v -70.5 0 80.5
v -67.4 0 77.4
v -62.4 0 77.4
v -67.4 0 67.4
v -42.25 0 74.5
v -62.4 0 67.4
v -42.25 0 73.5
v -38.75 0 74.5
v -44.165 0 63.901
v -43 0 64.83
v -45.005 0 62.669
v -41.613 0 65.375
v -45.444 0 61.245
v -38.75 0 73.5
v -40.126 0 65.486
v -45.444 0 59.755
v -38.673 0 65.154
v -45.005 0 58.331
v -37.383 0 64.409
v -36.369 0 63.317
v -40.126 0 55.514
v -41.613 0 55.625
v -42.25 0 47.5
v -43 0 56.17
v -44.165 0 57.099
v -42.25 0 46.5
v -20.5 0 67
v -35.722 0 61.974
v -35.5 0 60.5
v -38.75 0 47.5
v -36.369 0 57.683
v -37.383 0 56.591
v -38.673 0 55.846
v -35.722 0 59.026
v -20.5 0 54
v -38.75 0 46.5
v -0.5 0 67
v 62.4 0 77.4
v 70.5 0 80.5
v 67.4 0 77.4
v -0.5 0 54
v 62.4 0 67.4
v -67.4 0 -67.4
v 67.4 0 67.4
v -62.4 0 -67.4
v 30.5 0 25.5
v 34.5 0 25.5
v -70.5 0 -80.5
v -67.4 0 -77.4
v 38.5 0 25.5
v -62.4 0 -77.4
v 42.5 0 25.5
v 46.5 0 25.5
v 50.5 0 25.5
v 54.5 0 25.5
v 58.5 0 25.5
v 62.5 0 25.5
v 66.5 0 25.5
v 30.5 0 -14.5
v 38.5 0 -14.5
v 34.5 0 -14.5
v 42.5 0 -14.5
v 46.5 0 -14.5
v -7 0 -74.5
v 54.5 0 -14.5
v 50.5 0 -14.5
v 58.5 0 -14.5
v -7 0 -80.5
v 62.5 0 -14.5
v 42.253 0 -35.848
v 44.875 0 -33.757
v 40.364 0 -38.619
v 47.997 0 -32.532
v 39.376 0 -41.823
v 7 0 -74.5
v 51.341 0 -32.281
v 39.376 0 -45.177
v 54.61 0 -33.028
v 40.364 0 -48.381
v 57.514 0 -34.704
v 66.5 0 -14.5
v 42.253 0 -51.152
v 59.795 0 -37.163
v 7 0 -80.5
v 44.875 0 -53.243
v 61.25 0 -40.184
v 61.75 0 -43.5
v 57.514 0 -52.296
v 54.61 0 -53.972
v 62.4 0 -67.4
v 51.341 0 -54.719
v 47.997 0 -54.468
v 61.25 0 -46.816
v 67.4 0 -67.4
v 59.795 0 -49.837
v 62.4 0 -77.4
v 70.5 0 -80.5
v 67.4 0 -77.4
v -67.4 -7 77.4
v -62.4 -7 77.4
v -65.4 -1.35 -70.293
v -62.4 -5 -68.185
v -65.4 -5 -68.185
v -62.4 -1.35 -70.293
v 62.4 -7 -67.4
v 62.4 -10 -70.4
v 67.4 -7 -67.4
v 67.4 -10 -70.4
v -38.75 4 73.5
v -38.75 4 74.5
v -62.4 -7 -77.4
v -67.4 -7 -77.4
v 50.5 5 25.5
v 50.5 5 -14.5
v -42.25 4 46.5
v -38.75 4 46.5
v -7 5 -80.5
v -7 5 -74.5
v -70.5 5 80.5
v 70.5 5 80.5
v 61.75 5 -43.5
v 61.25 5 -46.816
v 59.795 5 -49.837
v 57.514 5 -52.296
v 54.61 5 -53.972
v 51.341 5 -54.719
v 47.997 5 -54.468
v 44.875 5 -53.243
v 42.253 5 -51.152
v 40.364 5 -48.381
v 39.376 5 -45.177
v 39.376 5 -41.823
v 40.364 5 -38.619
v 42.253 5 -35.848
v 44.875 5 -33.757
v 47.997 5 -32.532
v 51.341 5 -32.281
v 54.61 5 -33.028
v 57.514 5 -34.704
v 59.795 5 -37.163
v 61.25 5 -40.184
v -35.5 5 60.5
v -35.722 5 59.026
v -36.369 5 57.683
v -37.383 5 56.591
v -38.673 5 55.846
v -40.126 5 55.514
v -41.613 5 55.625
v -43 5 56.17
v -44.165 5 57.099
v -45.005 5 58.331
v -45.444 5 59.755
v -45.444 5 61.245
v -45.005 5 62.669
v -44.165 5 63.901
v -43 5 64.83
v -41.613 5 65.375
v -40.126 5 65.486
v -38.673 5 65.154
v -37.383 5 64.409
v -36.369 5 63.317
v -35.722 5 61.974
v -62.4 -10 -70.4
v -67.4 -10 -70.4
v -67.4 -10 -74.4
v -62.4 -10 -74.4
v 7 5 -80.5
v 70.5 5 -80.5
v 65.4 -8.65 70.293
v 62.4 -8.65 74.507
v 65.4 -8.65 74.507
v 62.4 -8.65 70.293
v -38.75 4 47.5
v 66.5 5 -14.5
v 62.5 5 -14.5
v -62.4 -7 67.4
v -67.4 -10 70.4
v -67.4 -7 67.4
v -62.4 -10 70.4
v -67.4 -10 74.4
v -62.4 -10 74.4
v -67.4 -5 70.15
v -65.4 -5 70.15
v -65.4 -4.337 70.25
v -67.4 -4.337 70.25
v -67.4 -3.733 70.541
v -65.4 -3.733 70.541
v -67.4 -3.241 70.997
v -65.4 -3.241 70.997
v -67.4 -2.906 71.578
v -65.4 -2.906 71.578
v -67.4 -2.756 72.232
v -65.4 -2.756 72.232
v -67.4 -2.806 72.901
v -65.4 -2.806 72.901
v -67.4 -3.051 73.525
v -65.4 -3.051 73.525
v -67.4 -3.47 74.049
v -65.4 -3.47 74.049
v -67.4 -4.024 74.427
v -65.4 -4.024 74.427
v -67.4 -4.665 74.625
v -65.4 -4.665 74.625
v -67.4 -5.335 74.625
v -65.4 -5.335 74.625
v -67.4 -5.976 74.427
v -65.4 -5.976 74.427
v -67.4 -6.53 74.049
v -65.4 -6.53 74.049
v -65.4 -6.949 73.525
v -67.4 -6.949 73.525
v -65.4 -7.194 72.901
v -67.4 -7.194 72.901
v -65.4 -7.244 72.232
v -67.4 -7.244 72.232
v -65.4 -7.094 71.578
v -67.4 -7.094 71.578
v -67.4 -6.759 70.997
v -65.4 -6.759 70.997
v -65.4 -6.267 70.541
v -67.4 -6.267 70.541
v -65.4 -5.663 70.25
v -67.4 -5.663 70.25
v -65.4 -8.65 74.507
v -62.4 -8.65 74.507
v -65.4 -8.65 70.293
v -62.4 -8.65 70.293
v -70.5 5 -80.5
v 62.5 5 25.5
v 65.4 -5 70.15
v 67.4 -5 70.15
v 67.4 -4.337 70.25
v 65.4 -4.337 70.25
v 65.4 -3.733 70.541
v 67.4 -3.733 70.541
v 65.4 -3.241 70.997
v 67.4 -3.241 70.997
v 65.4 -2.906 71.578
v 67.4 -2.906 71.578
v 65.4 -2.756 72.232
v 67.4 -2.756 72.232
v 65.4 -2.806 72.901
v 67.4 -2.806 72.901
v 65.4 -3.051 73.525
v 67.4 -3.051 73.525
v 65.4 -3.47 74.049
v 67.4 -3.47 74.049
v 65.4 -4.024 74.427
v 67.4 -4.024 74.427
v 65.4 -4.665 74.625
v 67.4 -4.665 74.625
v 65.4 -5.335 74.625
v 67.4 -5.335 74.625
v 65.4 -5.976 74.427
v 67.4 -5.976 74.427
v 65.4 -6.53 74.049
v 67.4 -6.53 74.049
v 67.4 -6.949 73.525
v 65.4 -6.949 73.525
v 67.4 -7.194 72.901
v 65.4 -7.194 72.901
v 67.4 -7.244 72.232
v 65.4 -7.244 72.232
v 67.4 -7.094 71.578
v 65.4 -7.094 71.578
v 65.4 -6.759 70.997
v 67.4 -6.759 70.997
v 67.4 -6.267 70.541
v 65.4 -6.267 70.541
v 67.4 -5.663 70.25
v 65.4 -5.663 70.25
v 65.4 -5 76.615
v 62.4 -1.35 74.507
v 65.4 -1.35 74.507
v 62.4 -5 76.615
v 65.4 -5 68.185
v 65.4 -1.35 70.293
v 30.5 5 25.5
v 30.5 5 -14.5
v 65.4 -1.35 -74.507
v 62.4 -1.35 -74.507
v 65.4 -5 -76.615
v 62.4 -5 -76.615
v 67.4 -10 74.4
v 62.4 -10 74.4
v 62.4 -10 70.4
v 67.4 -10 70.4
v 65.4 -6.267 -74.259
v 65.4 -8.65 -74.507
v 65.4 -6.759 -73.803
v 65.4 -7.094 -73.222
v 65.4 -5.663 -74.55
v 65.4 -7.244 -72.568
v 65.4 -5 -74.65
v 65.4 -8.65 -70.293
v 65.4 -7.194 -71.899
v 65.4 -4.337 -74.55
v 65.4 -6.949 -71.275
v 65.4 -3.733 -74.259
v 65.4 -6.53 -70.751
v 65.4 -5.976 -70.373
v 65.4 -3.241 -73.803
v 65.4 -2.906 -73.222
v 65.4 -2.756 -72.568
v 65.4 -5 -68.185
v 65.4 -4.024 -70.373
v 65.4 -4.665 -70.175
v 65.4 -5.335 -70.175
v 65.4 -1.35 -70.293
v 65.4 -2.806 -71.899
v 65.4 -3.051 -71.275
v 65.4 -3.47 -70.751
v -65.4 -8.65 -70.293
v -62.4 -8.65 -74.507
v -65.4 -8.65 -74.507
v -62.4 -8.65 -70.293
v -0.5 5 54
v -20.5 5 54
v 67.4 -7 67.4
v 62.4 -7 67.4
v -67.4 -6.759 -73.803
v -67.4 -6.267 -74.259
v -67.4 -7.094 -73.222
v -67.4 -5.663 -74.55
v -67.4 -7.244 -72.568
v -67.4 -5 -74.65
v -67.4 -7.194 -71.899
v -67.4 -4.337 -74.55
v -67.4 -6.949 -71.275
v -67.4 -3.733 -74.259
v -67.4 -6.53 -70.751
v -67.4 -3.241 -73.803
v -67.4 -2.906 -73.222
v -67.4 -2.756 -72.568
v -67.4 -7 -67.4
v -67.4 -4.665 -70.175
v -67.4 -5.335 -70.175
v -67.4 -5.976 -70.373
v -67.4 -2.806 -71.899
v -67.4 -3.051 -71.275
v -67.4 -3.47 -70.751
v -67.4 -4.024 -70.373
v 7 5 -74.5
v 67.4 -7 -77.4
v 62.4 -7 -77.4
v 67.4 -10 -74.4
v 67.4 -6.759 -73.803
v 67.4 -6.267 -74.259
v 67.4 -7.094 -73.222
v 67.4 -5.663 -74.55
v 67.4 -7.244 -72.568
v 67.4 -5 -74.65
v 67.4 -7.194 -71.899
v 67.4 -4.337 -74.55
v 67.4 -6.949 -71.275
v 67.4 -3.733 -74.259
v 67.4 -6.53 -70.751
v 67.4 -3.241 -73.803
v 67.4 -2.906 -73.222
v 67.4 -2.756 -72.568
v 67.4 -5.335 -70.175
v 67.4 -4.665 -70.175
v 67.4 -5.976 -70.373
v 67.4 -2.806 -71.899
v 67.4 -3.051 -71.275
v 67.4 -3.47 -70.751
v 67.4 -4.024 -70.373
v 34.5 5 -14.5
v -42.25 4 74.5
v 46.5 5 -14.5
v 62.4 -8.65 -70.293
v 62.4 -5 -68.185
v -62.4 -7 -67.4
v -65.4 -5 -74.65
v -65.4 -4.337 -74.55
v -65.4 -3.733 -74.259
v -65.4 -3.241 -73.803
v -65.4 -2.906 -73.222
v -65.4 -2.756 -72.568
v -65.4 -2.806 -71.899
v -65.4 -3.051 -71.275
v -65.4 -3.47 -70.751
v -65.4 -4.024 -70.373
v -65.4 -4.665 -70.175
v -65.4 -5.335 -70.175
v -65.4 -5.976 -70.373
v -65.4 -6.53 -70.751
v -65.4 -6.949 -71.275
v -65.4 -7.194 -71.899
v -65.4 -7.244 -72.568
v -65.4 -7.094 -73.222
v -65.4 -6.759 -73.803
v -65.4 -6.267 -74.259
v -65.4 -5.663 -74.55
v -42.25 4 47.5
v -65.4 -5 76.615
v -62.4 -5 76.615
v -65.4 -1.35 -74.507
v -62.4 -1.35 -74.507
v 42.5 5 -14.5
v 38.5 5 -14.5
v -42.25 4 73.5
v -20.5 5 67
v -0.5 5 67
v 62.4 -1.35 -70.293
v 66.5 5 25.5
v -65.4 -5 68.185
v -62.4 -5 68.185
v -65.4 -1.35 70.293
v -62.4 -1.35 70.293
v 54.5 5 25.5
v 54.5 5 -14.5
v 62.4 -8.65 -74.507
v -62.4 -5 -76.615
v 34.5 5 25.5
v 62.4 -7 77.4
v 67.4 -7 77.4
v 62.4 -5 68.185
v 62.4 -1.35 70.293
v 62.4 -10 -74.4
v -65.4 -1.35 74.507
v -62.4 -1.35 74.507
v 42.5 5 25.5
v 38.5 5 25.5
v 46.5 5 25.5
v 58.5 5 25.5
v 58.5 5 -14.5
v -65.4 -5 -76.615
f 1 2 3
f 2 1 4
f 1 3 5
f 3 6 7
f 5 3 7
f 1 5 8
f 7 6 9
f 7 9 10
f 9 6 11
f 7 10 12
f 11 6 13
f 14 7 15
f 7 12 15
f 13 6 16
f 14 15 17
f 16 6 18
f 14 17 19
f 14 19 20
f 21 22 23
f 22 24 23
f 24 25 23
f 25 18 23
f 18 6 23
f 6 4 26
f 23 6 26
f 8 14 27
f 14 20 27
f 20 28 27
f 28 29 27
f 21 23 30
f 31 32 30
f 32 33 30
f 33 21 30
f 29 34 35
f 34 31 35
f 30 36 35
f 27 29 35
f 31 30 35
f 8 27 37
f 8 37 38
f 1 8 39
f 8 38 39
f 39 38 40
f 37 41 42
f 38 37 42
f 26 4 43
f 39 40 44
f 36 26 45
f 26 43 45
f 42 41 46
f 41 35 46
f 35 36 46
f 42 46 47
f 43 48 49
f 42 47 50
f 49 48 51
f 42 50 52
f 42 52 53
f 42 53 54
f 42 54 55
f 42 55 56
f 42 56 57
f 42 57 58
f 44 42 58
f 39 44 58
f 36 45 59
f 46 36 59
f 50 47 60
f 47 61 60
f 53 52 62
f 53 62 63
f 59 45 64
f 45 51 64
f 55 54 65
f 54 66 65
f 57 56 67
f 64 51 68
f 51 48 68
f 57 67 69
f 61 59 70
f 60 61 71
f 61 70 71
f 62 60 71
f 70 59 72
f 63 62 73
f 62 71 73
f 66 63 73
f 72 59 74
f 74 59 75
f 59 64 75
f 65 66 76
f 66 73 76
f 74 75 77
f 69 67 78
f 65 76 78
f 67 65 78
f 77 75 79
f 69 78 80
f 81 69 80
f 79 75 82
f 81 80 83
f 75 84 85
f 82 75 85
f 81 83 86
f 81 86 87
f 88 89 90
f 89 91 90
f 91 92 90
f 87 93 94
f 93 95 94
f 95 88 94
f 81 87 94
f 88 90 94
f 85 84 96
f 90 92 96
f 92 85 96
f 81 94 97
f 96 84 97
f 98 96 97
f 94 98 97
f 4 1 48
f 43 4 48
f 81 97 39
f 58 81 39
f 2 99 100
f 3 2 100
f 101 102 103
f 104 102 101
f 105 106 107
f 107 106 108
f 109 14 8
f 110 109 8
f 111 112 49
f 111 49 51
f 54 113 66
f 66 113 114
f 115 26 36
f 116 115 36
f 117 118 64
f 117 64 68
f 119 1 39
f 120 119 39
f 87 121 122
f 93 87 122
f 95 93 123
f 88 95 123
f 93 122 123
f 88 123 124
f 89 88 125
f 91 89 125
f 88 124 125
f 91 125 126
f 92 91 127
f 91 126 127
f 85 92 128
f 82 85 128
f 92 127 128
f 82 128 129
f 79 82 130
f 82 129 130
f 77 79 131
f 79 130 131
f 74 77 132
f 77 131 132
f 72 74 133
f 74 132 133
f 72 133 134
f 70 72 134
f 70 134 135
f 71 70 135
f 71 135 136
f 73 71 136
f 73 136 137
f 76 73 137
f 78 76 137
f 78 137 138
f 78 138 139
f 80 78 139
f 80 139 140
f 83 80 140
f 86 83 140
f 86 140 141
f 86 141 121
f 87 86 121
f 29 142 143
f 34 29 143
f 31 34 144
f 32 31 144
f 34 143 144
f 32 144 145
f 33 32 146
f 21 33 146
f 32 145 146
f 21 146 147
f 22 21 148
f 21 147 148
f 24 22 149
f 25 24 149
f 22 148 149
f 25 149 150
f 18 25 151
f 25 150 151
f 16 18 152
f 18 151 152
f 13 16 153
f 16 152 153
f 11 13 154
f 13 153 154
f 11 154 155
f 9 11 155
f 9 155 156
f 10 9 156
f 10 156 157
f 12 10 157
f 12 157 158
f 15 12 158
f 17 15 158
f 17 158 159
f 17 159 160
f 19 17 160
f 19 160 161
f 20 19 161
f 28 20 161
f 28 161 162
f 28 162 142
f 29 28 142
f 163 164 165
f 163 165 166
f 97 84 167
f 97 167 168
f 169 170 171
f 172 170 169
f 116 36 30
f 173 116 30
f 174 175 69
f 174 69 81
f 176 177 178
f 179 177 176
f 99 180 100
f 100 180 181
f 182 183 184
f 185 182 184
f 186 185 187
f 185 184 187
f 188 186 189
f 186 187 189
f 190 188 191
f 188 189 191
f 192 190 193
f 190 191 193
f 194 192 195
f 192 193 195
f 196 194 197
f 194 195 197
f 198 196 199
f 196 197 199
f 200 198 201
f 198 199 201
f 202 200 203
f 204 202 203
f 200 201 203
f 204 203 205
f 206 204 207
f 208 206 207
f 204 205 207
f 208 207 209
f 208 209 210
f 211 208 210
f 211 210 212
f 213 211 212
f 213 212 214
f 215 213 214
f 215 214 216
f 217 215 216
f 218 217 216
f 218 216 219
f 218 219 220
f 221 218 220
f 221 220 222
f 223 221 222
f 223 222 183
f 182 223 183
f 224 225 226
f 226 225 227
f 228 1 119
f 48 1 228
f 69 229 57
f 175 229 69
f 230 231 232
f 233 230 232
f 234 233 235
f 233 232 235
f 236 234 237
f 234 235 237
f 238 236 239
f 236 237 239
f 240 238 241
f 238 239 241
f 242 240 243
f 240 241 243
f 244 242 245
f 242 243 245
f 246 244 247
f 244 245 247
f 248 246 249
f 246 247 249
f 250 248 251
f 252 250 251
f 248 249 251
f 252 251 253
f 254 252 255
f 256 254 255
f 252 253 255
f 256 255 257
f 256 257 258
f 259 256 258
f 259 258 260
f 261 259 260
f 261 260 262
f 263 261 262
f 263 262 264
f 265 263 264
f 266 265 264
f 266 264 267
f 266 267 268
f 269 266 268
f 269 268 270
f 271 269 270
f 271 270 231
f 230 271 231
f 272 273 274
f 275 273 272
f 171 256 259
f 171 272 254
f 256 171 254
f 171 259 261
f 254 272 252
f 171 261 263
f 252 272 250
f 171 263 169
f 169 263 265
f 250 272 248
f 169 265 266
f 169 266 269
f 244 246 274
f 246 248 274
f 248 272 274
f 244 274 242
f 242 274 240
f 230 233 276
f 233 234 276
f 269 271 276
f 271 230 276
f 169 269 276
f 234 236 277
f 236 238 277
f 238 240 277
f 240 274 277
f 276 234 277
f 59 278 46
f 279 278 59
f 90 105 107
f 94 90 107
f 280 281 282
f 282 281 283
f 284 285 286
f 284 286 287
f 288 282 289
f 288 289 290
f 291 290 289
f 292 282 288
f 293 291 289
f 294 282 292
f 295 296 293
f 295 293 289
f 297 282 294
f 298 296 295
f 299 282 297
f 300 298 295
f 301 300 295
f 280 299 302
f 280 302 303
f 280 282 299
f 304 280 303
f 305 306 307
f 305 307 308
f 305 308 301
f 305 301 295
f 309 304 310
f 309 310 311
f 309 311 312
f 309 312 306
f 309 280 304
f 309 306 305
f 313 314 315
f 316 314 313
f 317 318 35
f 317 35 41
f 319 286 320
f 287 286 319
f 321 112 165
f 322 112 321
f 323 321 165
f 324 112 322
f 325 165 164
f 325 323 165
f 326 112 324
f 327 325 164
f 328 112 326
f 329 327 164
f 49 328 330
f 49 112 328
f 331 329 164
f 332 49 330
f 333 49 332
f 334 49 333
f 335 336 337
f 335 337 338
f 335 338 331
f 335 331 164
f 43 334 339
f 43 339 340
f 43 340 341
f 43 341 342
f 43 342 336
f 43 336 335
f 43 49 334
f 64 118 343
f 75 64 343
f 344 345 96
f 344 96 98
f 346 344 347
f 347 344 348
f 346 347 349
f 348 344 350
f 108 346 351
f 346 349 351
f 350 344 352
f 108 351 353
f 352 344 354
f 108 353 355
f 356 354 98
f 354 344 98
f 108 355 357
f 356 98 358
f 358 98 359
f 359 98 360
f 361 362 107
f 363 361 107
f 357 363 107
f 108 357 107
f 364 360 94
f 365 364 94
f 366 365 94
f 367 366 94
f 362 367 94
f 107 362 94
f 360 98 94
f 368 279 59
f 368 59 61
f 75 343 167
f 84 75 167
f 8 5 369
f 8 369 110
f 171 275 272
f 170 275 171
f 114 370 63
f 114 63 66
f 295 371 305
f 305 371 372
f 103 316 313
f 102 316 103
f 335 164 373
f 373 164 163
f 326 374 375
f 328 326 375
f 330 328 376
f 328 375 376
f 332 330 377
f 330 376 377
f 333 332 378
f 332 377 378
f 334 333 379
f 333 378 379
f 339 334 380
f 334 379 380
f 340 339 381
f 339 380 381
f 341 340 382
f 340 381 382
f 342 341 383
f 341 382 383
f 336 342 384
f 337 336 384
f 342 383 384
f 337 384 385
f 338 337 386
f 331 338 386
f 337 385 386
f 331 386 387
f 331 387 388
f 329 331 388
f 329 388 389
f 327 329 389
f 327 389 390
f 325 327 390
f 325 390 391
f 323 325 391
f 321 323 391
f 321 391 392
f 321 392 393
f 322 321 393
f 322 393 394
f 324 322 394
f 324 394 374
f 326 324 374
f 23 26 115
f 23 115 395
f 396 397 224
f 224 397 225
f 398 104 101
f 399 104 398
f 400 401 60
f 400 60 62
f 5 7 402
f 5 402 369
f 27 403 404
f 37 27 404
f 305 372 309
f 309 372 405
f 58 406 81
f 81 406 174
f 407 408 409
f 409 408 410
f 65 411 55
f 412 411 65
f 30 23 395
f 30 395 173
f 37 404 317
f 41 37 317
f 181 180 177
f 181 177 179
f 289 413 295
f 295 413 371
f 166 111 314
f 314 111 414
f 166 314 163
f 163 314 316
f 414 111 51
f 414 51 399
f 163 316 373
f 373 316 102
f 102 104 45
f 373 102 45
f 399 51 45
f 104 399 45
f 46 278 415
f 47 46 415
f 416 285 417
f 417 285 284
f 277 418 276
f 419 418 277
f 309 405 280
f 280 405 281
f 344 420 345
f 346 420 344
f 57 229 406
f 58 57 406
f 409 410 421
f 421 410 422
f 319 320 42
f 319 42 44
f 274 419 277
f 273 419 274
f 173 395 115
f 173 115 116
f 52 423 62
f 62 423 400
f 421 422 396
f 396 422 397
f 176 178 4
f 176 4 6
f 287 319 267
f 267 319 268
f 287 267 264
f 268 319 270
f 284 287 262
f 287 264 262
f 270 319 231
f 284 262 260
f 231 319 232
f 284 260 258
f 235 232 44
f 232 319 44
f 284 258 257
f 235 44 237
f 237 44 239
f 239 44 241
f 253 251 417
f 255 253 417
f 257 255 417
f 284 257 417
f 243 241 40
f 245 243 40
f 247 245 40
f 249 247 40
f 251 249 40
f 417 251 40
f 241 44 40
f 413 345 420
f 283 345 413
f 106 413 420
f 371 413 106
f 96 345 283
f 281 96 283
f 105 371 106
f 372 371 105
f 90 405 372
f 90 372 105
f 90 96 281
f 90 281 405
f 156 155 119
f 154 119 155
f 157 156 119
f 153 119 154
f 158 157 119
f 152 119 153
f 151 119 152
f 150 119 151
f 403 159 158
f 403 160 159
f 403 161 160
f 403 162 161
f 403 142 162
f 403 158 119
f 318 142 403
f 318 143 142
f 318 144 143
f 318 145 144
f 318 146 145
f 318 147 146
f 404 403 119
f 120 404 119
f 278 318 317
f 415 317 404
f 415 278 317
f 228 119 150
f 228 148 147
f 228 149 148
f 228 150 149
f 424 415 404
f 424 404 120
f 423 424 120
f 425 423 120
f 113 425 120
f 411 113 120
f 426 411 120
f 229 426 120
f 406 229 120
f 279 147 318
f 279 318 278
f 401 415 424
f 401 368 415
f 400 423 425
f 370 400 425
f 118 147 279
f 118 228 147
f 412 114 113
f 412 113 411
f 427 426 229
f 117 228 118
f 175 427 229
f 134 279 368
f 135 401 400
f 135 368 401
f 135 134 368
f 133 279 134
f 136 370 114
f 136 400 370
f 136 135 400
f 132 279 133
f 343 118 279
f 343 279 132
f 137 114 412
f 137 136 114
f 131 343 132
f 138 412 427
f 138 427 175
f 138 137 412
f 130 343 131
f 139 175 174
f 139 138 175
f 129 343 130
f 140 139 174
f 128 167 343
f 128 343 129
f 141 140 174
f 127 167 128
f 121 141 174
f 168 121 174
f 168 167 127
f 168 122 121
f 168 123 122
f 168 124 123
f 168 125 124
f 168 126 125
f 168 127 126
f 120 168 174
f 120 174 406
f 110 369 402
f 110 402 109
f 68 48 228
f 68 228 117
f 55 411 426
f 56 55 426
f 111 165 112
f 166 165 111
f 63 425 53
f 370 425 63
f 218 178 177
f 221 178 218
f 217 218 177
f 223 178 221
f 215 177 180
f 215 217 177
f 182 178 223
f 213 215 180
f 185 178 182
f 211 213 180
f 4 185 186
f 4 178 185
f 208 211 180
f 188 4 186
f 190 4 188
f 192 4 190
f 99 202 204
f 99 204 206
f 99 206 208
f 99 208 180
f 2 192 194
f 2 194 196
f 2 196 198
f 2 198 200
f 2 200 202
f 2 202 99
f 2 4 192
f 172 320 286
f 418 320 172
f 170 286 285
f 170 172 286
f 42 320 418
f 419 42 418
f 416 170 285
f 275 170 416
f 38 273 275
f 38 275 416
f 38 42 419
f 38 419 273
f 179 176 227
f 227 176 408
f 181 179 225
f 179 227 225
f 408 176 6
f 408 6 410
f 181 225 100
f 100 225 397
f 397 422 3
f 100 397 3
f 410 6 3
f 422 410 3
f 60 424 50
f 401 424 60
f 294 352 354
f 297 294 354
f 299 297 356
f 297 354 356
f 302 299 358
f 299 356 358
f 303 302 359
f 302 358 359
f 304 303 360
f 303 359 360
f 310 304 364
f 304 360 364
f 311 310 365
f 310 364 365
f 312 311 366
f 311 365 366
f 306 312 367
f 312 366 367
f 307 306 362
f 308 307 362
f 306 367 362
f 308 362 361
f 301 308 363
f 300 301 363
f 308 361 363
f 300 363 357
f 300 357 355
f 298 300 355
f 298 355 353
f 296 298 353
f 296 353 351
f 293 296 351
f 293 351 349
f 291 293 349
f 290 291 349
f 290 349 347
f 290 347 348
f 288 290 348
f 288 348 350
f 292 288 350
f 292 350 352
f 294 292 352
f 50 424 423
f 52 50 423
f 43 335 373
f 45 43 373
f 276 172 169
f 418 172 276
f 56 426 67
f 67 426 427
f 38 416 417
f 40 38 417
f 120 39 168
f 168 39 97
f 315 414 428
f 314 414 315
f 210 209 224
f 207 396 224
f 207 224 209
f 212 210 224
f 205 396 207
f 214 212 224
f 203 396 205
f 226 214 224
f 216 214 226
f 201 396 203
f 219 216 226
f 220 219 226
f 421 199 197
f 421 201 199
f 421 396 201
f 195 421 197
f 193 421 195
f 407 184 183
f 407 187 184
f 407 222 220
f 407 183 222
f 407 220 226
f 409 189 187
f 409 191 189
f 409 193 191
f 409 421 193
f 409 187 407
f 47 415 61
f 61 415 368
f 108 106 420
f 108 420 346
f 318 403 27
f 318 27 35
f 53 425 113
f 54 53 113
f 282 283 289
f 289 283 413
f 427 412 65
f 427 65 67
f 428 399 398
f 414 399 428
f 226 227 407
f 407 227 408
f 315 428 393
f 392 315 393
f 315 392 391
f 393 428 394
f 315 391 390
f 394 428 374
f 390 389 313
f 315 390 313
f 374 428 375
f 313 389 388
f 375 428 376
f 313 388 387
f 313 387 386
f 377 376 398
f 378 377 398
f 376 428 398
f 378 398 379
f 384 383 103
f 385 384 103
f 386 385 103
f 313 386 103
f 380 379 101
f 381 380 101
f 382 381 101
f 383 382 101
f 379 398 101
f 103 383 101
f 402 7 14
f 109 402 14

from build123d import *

# Parameters (mm, degrees)
SKETCH1_W                      = 141
SKETCH1_H                      = 161
BOSS_EXTRUDE1_DEPTH            = 5
CUT_EXTRUDE1_REACH             = 7
SKETCH2_R                      = 11.25
CUT_EXTRUDE1_DIRECTION_2_DEPTH = 1
CUT_EXTRUDE2_REACH             = 7
SKETCH3_W                      = 4
SKETCH3_H                      = 40
SKETCH4_W                      = 5
SKETCH4_H                      = 10
BOSS_EXTRUDE2_DEPTH            = 10
SKETCH5_R                      = 2.25
CUT_EXTRUDE3_DEPTH             = 4.1
CUT_EXTRUDE3_DEPTH_BACK        = 138.9
CUT_EXTRUDE4_DEPTH             = 3
CHAMFER1_SIZE                  = 3
MIRROR4_COPY_1_DEPTH           = 3
CUT_EXTRUDE5_REACH             = 17
SKETCH7_R                      = 5
SKETCH7_W                      = 20
SKETCH7_H                      = 13
CUT_EXTRUDE5_DIRECTION_2_DEPTH = 1
SKETCH8_W                      = 3.5
SKETCH8_H                      = 1
CUT_EXTRUDE6_DEPTH             = 11
CUT_EXTRUDE6_DEPTH_BACK        = 4
CUT_EXTRUDE7_REACH             = 17
SKETCH9_W                      = 14
SKETCH9_H                      = 6
CUT_EXTRUDE7_DIRECTION_2_DEPTH = 1


with BuildPart() as part:
    # Sketch1 → Boss-Extrude1 (new body)
    with BuildSketch(Plane(origin=(0, 0, 0), x_dir=(1, 0, 0), z_dir=(0, 1, 0))):
        Rectangle(SKETCH1_W, SKETCH1_H)
    extrude(amount=BOSS_EXTRUDE1_DEPTH)

    # Sketch2 → Cut-Extrude1 (cut, up to next)
    with BuildSketch(Plane(origin=(0, 5, 0), x_dir=(1, 0, 0), z_dir=(0, 1, 0)), mode=Mode.PRIVATE) as cut_extrude1_sk1:
        with Locations((50.5, 43.5)):
            Circle(SKETCH2_R)
    cut_extrude1_tool1 = extrude(cut_extrude1_sk1.sketch, amount=-CUT_EXTRUDE1_REACH, mode=Mode.PRIVATE) & part.part
    add(cut_extrude1_tool1.solids().sort_by_distance((50.5, 5, -43.5))[0], mode=Mode.SUBTRACT)

    # Sketch2 → Cut-Extrude1 direction 2 (cut)
    with BuildSketch(Plane(origin=(0, 5, 0), x_dir=(1, 0, 0), z_dir=(0, 1, 0))):
        with Locations((50.5, 43.5)):
            Circle(SKETCH2_R)
    extrude(amount=CUT_EXTRUDE1_DIRECTION_2_DEPTH, mode=Mode.SUBTRACT)

    # Sketch3 → Cut-Extrude2 (cut, up to next)
    with BuildSketch(Plane(origin=(0, 5, 0), x_dir=(1, 0, 0), z_dir=(0, 1, 0)), mode=Mode.PRIVATE) as cut_extrude2_sk1:
        with Locations((40.5, -5.5)):
            Rectangle(SKETCH3_W, SKETCH3_H)
    cut_extrude2_tool1 = extrude(cut_extrude2_sk1.sketch, amount=-CUT_EXTRUDE2_REACH, mode=Mode.PRIVATE) & part.part
    add(cut_extrude2_tool1.solids().sort_by_distance((40.5, 5, 5.5))[0], mode=Mode.SUBTRACT)
    # Sketch3 → Cut-Extrude2 (cut, up to next)
    with BuildSketch(Plane(origin=(0, 5, 0), x_dir=(1, 0, 0), z_dir=(0, 1, 0)), mode=Mode.PRIVATE) as cut_extrude2_sk2:
        with Locations((32.5, -5.5)):
            Rectangle(SKETCH3_W, SKETCH3_H)
    cut_extrude2_tool2 = extrude(cut_extrude2_sk2.sketch, amount=-CUT_EXTRUDE2_REACH, mode=Mode.PRIVATE) & part.part
    add(cut_extrude2_tool2.solids().sort_by_distance((32.5, 5, 5.5))[0], mode=Mode.SUBTRACT)
    # Sketch3 → Cut-Extrude2 (cut, up to next)
    with BuildSketch(Plane(origin=(0, 5, 0), x_dir=(1, 0, 0), z_dir=(0, 1, 0)), mode=Mode.PRIVATE) as cut_extrude2_sk3:
        with Locations((48.5, -5.5)):
            Rectangle(SKETCH3_W, SKETCH3_H)
    cut_extrude2_tool3 = extrude(cut_extrude2_sk3.sketch, amount=-CUT_EXTRUDE2_REACH, mode=Mode.PRIVATE) & part.part
    add(cut_extrude2_tool3.solids().sort_by_distance((48.5, 5, 5.5))[0], mode=Mode.SUBTRACT)
    # Sketch3 → Cut-Extrude2 (cut, up to next)
    with BuildSketch(Plane(origin=(0, 5, 0), x_dir=(1, 0, 0), z_dir=(0, 1, 0)), mode=Mode.PRIVATE) as cut_extrude2_sk4:
        with Locations((56.5, -5.5)):
            Rectangle(SKETCH3_W, SKETCH3_H)
    cut_extrude2_tool4 = extrude(cut_extrude2_sk4.sketch, amount=-CUT_EXTRUDE2_REACH, mode=Mode.PRIVATE) & part.part
    add(cut_extrude2_tool4.solids().sort_by_distance((56.5, 5, 5.5))[0], mode=Mode.SUBTRACT)
    # Sketch3 → Cut-Extrude2 (cut, up to next)
    with BuildSketch(Plane(origin=(0, 5, 0), x_dir=(1, 0, 0), z_dir=(0, 1, 0)), mode=Mode.PRIVATE) as cut_extrude2_sk5:
        with Locations((64.5, -5.5)):
            Rectangle(SKETCH3_W, SKETCH3_H)
    cut_extrude2_tool5 = extrude(cut_extrude2_sk5.sketch, amount=-CUT_EXTRUDE2_REACH, mode=Mode.PRIVATE) & part.part
    add(cut_extrude2_tool5.solids().sort_by_distance((64.5, 5, 5.5))[0], mode=Mode.SUBTRACT)

    # Sketch4 → Boss-Extrude2 (add)
    with BuildSketch(Plane.XZ):
        with Locations((64.9, 72.4)):
            Rectangle(SKETCH4_W, SKETCH4_H)
        with Locations((-64.9, 72.4)):
            Rectangle(SKETCH4_W, SKETCH4_H)
        with Locations((64.9, -72.4)):
            Rectangle(SKETCH4_W, SKETCH4_H)
        with Locations((-64.9, -72.4)):
            Rectangle(SKETCH4_W, SKETCH4_H)
    extrude(amount=BOSS_EXTRUDE2_DEPTH)

    # Sketch5 → Cut-Extrude3 (cut, two sides)
    with BuildSketch(Plane(origin=(67.4, 0, 0), x_dir=(0, 0, -1), z_dir=(1, 0, 0))) as cut_extrude3_sk:
        with Locations((-72.4, -5)):
            Circle(SKETCH5_R)
        with Locations((72.4, -5)):
            Circle(SKETCH5_R)
    extrude(amount=CUT_EXTRUDE3_DEPTH, mode=Mode.SUBTRACT)
    extrude(cut_extrude3_sk.sketch, amount=-CUT_EXTRUDE3_DEPTH_BACK, mode=Mode.SUBTRACT)

    # Sketch6 → Cut-Extrude4 (cut)
    with BuildSketch(Plane(origin=(-62.4, 0, 0), x_dir=(0, 0, -1), z_dir=(1, 0, 0))):
        Polygon((-68.185343035, -5), (-70.292671517, -1.35), (-74.507328483, -1.35), (-76.614656965, -5), (-74.507328483, -8.65), (-70.292671517, -8.65), align=None)
    cut_extrude4 = extrude(amount=-CUT_EXTRUDE4_DEPTH, mode=Mode.SUBTRACT)

    # Chamfer1
    chamfer1_edges = [part.edges().sort_by_distance(p)[0] for p in [
        (-64.9, -10, 77.4),
        (-64.9, -10, 67.4),
        (64.9, -10, -77.4),
        (64.9, -10, -67.4),
        (-64.9, -10, -77.4),
        (-64.9, -10, -67.4),
        (64.9, -10, 67.4),
        (64.9, -10, 77.4),
    ]]
    chamfer(chamfer1_edges, length=CHAMFER1_SIZE)

    # Mirror3: Cut-Extrude4 across plane
    add(cut_extrude4.mirror(Plane(origin=(0, 0, 0), x_dir=(0, 0, 1), z_dir=(1, 0, 0))), mode=Mode.SUBTRACT)

    # Mirror4: Cut-Extrude4 across plane
    add(cut_extrude4.mirror(Plane.XY), mode=Mode.SUBTRACT)

    # Mirror4 copy 1 sketch → Mirror4 copy 1 (cut)
    with BuildSketch(Plane.ZY.offset(-62.4)):
        Polygon((-68.185343035, -5), (-70.292671517, -1.35), (-74.507328483, -1.35), (-76.614656965, -5), (-74.507328483, -8.65), (-70.292671517, -8.65), align=None)
    extrude(amount=-MIRROR4_COPY_1_DEPTH, mode=Mode.SUBTRACT)

    # Sketch7 → Cut-Extrude5 (cut, up to next)
    with BuildSketch(Plane(origin=(0, 5, 0), x_dir=(1, 0, 0), z_dir=(0, 1, 0)), mode=Mode.PRIVATE) as cut_extrude5_sk1:
        with Locations((-40.5, -60.5)):
            Circle(SKETCH7_R)
    cut_extrude5_tool1 = extrude(cut_extrude5_sk1.sketch, amount=-CUT_EXTRUDE5_REACH, mode=Mode.PRIVATE) & part.part
    add(cut_extrude5_tool1.solids().sort_by_distance((-40.5, 5, 60.5))[0], mode=Mode.SUBTRACT)
    # Sketch7 → Cut-Extrude5 (cut, up to next)
    with BuildSketch(Plane(origin=(0, 5, 0), x_dir=(1, 0, 0), z_dir=(0, 1, 0)), mode=Mode.PRIVATE) as cut_extrude5_sk2:
        with Locations((-10.5, -60.5)):
            Rectangle(SKETCH7_W, SKETCH7_H)
    cut_extrude5_tool2 = extrude(cut_extrude5_sk2.sketch, amount=-CUT_EXTRUDE5_REACH, mode=Mode.PRIVATE) & part.part
    add(cut_extrude5_tool2.solids().sort_by_distance((-10.5, 5, 60.5))[0], mode=Mode.SUBTRACT)

    # Sketch7 → Cut-Extrude5 direction 2 (cut)
    with BuildSketch(Plane(origin=(0, 5, 0), x_dir=(1, 0, 0), z_dir=(0, 1, 0))):
        with Locations((-40.5, -60.5)):
            Circle(SKETCH7_R)
        with Locations((-10.5, -60.5)):
            Rectangle(SKETCH7_W, SKETCH7_H)
    extrude(amount=CUT_EXTRUDE5_DIRECTION_2_DEPTH, mode=Mode.SUBTRACT)

    # Sketch8 → Cut-Extrude6 (cut, two sides)
    with BuildSketch(Plane.XZ) as cut_extrude6_sk:
        with Locations((-40.5, 74)):
            Rectangle(SKETCH8_W, SKETCH8_H)
        with Locations((-40.5, 47)):
            Rectangle(SKETCH8_W, SKETCH8_H)
    extrude(amount=CUT_EXTRUDE6_DEPTH, mode=Mode.SUBTRACT)
    extrude(cut_extrude6_sk.sketch, amount=-CUT_EXTRUDE6_DEPTH_BACK, mode=Mode.SUBTRACT)

    # Sketch9 → Cut-Extrude7 (cut, up to next)
    with BuildSketch(Plane(origin=(0, 5, 0), x_dir=(1, 0, 0), z_dir=(0, 1, 0)), mode=Mode.PRIVATE) as cut_extrude7_sk1:
        with Locations((0, 77.5)):
            Rectangle(SKETCH9_W, SKETCH9_H)
    cut_extrude7_tool1 = extrude(cut_extrude7_sk1.sketch, amount=-CUT_EXTRUDE7_REACH, mode=Mode.PRIVATE) & part.part
    add(cut_extrude7_tool1.solids().sort_by_distance((0, 5, -77.5))[0], mode=Mode.SUBTRACT)

    # Sketch9 → Cut-Extrude7 direction 2 (cut)
    with BuildSketch(Plane(origin=(0, 5, 0), x_dir=(1, 0, 0), z_dir=(0, 1, 0))):
        with Locations((0, 77.5)):
            Rectangle(SKETCH9_W, SKETCH9_H)
    extrude(amount=CUT_EXTRUDE7_DIRECTION_2_DEPTH, mode=Mode.SUBTRACT)


solid = part.part
